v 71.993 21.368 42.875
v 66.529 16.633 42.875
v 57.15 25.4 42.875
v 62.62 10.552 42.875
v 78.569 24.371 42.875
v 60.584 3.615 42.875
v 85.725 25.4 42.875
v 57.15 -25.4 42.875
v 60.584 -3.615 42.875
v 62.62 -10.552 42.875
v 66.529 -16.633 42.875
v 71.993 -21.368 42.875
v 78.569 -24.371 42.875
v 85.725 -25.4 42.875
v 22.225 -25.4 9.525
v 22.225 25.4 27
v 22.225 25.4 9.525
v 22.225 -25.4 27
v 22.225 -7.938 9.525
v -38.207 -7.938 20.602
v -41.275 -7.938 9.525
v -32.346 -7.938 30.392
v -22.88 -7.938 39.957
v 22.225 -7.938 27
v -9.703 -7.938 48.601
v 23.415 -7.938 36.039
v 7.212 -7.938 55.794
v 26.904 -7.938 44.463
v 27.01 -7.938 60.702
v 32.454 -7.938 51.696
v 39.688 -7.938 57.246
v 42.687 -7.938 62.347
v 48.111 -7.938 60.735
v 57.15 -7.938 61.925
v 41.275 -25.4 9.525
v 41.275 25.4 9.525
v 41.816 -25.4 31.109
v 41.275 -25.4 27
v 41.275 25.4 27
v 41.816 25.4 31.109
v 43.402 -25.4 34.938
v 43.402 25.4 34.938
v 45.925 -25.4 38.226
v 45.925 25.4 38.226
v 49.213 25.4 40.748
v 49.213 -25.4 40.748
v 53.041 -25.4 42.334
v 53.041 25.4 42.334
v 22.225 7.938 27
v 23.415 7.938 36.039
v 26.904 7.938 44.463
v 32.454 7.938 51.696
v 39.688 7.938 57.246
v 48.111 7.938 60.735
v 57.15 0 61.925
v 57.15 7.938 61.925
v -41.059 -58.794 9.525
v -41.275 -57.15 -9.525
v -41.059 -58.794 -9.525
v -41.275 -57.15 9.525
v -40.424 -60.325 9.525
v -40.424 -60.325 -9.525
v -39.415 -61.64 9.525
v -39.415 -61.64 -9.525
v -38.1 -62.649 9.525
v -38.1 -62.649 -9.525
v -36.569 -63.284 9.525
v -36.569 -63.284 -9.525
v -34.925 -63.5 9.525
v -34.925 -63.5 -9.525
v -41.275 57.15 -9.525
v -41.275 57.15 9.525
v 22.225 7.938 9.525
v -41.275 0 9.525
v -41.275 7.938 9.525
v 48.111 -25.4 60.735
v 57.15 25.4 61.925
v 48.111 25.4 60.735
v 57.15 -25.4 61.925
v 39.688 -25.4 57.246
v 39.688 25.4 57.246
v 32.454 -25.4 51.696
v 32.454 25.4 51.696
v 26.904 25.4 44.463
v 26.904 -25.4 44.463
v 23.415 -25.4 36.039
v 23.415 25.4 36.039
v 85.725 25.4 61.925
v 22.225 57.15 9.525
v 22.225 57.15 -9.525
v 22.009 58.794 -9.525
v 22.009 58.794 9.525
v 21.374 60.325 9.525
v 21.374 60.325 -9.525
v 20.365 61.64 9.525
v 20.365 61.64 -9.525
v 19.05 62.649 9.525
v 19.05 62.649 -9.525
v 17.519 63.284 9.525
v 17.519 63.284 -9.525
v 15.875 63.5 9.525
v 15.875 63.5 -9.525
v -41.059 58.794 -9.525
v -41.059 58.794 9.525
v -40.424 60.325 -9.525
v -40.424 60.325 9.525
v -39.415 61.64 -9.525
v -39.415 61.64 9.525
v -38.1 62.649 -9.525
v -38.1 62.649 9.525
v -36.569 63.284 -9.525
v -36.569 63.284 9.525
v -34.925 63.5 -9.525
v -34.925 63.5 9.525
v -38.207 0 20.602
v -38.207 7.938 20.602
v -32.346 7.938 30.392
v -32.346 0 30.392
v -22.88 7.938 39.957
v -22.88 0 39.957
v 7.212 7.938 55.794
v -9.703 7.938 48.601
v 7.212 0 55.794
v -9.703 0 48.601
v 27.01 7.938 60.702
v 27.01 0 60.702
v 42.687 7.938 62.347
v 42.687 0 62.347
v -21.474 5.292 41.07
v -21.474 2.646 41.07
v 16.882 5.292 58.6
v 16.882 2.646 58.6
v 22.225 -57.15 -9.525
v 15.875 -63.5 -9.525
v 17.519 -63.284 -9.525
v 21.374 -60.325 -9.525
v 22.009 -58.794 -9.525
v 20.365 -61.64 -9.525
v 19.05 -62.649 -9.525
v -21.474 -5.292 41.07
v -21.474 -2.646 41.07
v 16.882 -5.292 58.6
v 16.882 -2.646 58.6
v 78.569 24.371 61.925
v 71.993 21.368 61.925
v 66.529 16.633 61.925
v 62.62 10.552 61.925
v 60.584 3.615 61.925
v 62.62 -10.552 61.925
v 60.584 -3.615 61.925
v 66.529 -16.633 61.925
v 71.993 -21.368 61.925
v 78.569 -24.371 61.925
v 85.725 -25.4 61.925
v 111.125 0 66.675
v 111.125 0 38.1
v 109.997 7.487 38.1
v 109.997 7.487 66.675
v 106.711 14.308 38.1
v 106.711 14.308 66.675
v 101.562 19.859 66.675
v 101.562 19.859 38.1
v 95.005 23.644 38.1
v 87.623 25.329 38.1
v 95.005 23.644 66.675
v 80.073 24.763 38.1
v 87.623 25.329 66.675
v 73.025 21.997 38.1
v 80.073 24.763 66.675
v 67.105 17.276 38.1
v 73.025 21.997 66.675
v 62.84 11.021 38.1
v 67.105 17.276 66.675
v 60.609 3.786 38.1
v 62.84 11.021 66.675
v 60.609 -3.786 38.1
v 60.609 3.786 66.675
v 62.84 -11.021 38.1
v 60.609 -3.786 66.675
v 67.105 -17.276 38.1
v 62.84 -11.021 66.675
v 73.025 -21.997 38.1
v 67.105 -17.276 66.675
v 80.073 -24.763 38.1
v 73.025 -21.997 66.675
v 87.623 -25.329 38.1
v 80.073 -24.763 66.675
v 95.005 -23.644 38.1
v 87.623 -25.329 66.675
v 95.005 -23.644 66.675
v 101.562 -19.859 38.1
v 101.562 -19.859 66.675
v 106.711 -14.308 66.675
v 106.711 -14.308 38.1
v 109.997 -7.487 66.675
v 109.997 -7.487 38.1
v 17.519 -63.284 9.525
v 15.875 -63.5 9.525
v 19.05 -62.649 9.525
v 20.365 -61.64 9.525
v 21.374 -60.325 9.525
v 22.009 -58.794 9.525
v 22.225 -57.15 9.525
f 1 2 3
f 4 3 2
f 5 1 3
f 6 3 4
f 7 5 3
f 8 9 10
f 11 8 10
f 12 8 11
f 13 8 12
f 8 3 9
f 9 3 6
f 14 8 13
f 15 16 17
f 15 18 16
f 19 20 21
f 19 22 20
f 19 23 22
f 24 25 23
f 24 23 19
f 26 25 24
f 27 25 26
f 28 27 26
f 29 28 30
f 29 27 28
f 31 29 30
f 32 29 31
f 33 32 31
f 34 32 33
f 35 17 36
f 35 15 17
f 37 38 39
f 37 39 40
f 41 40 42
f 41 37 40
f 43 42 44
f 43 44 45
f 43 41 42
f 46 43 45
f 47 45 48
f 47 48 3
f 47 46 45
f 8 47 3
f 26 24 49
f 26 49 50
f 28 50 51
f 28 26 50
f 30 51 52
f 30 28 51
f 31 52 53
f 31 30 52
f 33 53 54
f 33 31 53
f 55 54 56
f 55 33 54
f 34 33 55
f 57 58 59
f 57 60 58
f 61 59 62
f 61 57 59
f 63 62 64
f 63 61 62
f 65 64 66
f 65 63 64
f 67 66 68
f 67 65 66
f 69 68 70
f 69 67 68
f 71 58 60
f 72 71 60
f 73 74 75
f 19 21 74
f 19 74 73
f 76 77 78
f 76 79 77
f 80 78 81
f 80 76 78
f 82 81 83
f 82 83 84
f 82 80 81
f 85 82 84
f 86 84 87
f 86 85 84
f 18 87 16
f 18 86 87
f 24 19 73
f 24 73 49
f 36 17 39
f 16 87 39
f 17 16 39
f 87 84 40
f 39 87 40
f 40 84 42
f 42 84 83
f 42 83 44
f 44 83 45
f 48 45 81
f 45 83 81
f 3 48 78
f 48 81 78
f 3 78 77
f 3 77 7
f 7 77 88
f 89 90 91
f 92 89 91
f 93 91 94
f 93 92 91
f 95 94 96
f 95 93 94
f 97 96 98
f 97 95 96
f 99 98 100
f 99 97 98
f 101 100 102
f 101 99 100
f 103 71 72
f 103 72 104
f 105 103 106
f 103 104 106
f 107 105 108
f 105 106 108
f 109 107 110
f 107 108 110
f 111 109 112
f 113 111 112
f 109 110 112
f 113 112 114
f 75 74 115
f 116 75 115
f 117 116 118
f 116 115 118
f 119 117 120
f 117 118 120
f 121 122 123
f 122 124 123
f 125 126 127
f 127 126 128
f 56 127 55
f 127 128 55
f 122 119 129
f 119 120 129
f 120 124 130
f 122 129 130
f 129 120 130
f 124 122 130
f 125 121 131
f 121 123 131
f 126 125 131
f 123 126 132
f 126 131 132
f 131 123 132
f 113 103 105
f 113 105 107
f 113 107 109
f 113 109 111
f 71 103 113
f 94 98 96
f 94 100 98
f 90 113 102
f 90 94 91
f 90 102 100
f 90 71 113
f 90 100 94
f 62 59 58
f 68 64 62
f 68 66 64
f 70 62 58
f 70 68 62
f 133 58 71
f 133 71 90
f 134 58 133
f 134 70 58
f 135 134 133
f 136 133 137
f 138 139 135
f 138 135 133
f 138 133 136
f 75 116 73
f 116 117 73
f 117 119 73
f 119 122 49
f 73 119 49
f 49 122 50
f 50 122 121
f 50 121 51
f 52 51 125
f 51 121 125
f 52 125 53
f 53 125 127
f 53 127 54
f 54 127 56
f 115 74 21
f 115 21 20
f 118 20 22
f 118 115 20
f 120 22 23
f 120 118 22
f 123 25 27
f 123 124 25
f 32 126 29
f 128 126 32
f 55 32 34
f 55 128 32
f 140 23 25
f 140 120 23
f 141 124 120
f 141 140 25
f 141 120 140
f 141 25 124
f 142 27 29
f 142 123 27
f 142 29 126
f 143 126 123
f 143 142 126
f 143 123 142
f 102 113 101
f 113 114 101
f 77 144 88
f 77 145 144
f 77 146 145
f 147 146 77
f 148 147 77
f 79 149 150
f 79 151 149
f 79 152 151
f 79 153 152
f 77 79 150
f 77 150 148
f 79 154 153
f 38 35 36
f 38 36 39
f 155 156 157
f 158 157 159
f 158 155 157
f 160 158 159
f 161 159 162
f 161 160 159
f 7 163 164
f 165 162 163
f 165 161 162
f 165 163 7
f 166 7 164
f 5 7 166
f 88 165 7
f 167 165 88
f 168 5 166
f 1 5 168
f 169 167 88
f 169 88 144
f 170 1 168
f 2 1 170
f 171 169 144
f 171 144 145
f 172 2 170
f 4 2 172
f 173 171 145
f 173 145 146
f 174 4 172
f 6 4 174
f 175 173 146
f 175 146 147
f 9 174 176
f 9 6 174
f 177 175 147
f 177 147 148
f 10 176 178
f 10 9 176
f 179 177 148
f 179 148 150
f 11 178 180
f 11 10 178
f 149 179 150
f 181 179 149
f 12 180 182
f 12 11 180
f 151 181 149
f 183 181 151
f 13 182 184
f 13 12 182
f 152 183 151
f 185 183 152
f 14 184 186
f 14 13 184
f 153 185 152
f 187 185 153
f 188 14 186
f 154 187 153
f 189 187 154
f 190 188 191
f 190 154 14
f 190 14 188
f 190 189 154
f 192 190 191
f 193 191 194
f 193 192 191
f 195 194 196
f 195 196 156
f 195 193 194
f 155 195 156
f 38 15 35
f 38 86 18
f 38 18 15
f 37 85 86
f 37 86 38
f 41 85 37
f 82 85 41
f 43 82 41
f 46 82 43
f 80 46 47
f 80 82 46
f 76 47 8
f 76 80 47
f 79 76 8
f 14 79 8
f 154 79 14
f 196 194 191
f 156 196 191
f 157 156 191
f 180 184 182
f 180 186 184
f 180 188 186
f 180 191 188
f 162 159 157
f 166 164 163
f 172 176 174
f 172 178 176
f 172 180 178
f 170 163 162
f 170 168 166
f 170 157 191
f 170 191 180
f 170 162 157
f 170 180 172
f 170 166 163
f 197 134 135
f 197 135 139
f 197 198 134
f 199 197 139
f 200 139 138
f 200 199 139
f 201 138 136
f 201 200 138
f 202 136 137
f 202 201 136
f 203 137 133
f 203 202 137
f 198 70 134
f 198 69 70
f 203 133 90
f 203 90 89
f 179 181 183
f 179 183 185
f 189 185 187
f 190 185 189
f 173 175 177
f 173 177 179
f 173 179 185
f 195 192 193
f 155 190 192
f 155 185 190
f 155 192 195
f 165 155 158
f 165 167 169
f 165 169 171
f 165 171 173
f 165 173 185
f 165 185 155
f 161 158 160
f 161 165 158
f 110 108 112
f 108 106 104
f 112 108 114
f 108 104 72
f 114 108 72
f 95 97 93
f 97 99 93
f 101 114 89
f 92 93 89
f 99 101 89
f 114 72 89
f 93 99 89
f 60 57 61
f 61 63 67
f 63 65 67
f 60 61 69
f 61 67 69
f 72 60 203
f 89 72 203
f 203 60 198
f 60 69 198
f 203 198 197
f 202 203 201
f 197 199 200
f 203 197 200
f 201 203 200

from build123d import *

# Parameters (mm, degrees)
F0_W     = 63.5
F0_H     = 19.05
F1_DEPTH = 63.5
F0_W_2   = 25.4
F2_DEPTH = 25.4
F3_DEPTH = 7.9375
F5_R     = 6.35


with BuildPart() as f1:
    # F0 (on Front) → F1 (new body, symmetric)
    with BuildSketch(Plane.XZ):
        with Locations((-9.525, 0)):
            Rectangle(F0_W, F0_H)
    extrude(amount=F1_DEPTH, both=True)

    # F5
    f5_edges = [f1.edges().sort_by_distance(p)[0] for p in [
        (-41.275, -63.5, 0),
        (22.225, -63.5, 0),
        (-41.275, 63.5, 0),
        (22.225, 63.5, 0),
    ]]
    fillet(f5_edges, radius=F5_R)


with BuildPart() as f2:
    # F0 (on Front) → F2 (new body, symmetric)
    with BuildSketch(Plane.XZ):
        with BuildLine():
            Line((22.225, 9.525), (41.275, 9.525))
            Line((41.275, 9.525), (41.275, 27.0002))
            ThreePointArc((41.275, 27.0002), (45.9246798487, 38.2255201513), (57.15, 42.8752))
            Line((57.15, 42.8752), (60.325, 42.8752))
            Line((60.325, 42.8752), (60.325, 61.9252))
            Line((60.325, 61.9252), (57.15, 61.9252))
            ThreePointArc((57.15, 61.9252), (32.4542956671, 51.6959043329), (22.225, 27.0002))
            Line((22.225, 27.0002), (22.225, 9.525))
        make_face()
        with Locations((73.025, 52.4002)):
            Rectangle(F0_W_2, F0_H)
    extrude(amount=F2_DEPTH, both=True)

    # F0 (on Front) → F4 (revolve)
    with BuildSketch(Plane.XZ):
        Polygon((85.725, 61.9252), (85.725, 42.8752), (85.725, 38.1), (111.125, 38.1), (111.125, 66.675), (85.725, 66.675), align=None)
    revolve(axis=Axis((85.725, 0, 52.3875), (0, 0, 1)))


with BuildPart() as f3:
    # F0 (on Front) → F3 (new body, symmetric)
    with BuildSketch(Plane.XZ):
        with BuildLine():
            Line((-41.275, 9.525), (22.225, 9.525))
            Line((22.225, 9.525), (22.225, 27.0002))
            ThreePointArc((22.225, 27.0002), (32.4542956671, 51.6959043329), (57.15, 61.9252))
            add(Edge.make_bspline(
                [(-41.275, 9.525), (-36.2995113248, 48.0142694389), (21.47303888, 65.7654965479), (57.15, 61.9252)],
                knots=[0, 0, 0, 0, 111.5045361635, 111.5045361635, 111.5045361635, 111.5045361635], degree=3))
        make_face()
    extrude(amount=F3_DEPTH, both=True)


solid = Compound([f1.part, f2.part, f3.part])
